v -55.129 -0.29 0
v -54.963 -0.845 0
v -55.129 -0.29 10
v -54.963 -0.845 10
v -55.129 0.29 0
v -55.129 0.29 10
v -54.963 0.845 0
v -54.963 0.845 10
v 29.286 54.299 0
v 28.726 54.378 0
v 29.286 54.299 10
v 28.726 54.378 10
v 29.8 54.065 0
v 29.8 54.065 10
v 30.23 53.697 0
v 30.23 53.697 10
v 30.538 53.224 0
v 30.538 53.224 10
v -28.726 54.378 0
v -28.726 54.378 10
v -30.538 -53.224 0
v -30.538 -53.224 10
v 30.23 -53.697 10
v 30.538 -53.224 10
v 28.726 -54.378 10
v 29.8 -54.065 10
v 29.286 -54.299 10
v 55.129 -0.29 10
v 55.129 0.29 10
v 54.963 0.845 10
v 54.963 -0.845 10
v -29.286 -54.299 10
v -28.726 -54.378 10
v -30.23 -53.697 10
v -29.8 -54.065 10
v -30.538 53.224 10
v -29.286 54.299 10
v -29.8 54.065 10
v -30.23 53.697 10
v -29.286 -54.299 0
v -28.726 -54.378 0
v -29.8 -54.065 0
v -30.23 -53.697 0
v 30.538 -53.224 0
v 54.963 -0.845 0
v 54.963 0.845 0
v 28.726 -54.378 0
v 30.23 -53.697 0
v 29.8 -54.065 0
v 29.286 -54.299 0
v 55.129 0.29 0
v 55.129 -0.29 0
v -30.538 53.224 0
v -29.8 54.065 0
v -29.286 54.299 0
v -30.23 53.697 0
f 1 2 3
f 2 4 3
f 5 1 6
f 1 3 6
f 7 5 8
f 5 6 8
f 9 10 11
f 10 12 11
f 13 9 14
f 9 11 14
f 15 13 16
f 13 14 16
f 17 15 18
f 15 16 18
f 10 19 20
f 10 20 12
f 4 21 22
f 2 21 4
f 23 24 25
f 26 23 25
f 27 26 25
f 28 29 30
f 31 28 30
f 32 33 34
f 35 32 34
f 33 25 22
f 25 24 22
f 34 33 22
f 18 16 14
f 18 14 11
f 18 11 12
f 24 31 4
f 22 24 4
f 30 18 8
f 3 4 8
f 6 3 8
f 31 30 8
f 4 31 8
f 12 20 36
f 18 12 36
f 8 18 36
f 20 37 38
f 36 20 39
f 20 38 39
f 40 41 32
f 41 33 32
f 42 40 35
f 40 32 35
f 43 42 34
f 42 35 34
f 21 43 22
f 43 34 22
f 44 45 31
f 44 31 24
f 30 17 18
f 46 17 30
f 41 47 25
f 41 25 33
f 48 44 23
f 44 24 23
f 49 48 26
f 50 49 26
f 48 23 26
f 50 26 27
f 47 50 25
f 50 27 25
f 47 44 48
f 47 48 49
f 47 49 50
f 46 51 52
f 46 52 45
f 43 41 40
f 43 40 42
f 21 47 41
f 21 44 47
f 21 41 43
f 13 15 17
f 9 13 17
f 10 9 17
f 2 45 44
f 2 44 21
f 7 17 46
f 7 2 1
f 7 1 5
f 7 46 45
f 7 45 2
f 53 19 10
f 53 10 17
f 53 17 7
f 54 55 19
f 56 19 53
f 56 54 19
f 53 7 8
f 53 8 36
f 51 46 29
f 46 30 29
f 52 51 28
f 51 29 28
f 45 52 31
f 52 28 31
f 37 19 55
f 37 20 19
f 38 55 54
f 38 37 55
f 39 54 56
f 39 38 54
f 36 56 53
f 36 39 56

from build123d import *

# Parameters (mm, degrees)
PAD_DEPTH = 10
FILLET_R  = 2


with BuildPart() as part:
    # Sketch → Pad (new body)
    with BuildSketch(Plane.XY):
        Polygon((-30, 54.378467), (30, 54.378467), (55.357096, 0), (30, -54.378467), (-30, -54.378467), (-55.357096, 0), align=None)
    extrude(amount=PAD_DEPTH)

    # Fillet
    fillet_edges = [part.edges().sort_by_distance(p)[0] for p in [
        (30, 54.378467, 5),
        (-30, 54.378467, 5),
        (-55.357096, 0, 5),
        (-30, -54.378467, 5),
        (30, -54.378467, 5),
        (55.357096, 0, 5),
    ]]
    fillet(fillet_edges, radius=FILLET_R)


solid = part.part
